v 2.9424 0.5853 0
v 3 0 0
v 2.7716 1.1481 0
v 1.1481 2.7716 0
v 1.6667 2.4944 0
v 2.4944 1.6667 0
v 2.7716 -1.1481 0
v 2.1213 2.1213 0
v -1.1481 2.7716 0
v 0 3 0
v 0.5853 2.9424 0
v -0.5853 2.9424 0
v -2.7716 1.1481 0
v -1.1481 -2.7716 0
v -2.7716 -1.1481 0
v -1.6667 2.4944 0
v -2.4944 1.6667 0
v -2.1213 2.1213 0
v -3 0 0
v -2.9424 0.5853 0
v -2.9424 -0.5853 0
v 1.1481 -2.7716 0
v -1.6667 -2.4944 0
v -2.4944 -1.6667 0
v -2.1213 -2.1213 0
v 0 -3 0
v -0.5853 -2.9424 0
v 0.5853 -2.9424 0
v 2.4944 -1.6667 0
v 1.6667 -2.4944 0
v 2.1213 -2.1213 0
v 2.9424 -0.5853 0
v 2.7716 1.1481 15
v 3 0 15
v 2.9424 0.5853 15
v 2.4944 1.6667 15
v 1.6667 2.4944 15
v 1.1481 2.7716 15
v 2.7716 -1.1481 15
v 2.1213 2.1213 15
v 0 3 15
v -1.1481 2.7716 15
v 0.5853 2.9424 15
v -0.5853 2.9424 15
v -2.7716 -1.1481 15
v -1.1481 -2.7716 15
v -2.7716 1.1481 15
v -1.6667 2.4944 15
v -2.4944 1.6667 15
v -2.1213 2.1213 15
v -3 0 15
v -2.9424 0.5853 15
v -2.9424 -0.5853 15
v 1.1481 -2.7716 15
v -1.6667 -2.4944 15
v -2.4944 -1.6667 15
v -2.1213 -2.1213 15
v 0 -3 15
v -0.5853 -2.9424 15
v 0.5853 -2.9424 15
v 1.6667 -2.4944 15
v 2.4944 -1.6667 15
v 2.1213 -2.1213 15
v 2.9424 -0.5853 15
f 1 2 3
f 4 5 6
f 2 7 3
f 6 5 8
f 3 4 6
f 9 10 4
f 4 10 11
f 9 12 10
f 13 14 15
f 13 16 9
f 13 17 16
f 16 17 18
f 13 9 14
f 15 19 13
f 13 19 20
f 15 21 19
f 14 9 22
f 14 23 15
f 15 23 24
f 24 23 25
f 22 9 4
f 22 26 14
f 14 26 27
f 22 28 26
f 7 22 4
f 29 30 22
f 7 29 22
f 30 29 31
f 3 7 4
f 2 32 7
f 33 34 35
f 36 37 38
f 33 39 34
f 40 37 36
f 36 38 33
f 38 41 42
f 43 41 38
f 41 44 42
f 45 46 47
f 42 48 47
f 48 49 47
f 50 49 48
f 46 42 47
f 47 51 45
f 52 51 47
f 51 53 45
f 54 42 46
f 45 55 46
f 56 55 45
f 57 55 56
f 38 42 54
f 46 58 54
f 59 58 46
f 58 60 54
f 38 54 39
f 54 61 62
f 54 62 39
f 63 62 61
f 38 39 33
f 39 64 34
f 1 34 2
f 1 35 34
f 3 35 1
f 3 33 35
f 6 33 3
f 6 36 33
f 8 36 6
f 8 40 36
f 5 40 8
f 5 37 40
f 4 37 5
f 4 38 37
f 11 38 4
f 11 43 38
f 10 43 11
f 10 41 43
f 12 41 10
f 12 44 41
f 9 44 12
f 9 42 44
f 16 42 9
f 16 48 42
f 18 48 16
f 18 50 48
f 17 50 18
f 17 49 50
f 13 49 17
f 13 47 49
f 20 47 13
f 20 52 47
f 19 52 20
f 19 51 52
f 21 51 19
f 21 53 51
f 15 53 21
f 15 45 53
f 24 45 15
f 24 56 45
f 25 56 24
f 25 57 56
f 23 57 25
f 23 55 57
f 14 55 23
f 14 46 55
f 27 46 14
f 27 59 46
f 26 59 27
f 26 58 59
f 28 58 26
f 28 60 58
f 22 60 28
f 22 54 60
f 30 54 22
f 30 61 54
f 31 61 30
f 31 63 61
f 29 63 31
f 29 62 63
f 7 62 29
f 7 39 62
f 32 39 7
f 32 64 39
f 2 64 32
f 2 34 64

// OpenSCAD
linear_extrude( 15.000000 )
   circle( r=3.000000, $fn=32 );
